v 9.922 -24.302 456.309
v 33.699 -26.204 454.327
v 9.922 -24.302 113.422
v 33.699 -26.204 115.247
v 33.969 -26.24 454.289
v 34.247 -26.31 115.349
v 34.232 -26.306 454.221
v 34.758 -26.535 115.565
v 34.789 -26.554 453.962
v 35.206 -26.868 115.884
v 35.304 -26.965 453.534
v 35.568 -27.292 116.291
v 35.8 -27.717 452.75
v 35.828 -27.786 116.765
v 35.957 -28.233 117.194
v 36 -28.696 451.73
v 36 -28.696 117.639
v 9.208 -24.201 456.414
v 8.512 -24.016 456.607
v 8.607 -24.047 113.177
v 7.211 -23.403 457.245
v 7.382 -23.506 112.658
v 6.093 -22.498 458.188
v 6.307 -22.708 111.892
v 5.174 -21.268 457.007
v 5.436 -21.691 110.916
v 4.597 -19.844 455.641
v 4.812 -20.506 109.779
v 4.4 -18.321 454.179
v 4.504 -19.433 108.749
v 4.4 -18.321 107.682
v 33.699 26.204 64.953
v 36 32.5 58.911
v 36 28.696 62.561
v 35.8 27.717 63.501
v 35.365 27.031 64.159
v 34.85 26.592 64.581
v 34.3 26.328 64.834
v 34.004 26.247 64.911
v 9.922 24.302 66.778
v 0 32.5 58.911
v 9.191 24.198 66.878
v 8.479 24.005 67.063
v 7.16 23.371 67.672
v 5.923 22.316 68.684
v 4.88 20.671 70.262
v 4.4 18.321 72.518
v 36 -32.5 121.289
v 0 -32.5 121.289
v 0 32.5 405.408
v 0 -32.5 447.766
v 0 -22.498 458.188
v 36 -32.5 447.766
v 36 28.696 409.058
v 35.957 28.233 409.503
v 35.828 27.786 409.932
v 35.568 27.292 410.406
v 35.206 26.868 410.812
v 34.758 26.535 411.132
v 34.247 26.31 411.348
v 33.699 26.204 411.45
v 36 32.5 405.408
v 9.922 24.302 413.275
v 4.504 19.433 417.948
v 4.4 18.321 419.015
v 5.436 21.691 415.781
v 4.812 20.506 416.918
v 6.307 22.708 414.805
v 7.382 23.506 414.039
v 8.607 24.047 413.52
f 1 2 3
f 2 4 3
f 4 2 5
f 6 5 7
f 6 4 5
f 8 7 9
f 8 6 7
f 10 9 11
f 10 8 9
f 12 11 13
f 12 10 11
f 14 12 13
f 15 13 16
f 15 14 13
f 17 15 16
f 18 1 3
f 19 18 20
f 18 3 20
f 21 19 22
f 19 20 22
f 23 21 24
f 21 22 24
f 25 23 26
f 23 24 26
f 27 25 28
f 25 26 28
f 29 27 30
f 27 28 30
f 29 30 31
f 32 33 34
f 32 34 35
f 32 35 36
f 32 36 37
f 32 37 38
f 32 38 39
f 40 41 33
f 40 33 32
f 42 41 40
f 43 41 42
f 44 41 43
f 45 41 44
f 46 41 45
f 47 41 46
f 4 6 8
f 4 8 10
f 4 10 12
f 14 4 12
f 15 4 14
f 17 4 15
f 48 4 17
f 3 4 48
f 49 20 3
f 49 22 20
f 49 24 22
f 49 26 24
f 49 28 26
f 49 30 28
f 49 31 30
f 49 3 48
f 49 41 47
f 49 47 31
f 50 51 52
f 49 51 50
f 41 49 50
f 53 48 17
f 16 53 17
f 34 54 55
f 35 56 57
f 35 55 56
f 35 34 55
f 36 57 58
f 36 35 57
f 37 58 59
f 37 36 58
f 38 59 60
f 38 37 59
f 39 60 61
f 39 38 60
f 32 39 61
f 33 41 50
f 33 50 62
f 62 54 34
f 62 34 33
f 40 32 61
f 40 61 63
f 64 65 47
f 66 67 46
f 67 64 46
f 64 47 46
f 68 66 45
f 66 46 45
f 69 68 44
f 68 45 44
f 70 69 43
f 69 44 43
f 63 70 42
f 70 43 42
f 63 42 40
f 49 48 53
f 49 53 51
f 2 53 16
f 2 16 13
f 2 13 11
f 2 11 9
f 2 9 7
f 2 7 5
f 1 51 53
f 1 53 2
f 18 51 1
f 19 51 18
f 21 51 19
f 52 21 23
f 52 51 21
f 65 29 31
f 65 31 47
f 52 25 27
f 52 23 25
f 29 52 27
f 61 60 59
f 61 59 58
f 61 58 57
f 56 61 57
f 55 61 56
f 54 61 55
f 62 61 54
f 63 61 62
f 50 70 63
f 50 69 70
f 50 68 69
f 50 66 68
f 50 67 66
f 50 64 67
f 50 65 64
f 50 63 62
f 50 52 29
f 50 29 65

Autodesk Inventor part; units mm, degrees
ref_plane "Начальная плоскость" through (0, 0, 58.9006) normal (0, 0, 1) x (1, 0, 0)
ref_plane "Конечная плоскость" through (0, 0, 458.193) normal (0, 0, 1) x (1, 0, 0)
sketch "Эскиз" plane through (0, 0, 0) normal (0, 0, 1) x (1, 0, 0)
  line L0 (36, -32.5) -> (0, -32.5)
  line L1 (36, -32.5) -> (36, -28.696)
  line L2 (33.6994, -26.2039) -> (9.9215, -24.3017)
  line L3 (4.4, -18.3208) -> (4.4, 18.3208)
  line L4 (33.6994, 26.2039) -> (9.9215, 24.3017)
  line L5 (36, 28.696) -> (36, 32.5)
  line L6 (0, 32.5) -> (36, 32.5)
  line L7 (0, -32.5) -> (0, 32.5)
  arc A0 (4.4, -18.3208) -> (9.9215, -24.3017) centre (10.4, -18.3208) ccw
  arc A1 (9.9215, 24.3017) -> (4.4, 18.3208) centre (10.4, 18.3208) ccw
  arc A2 (36, -28.696) -> (33.6994, -26.2039) centre (33.5, -28.696) ccw
  arc A3 (33.6994, 26.2039) -> (36, 28.696) centre (33.5, 28.696) ccw
  line L8 (0, 45.5) -> (0, -45.5) construction
  line L9 (-7.2974, 0) -> (43.7847, 0) construction
  point P0 (36, -26.388)
  point P1 (4.4, -23.86)
  point P2 (4.4, 23.86)
  point P3 (36, 26.388)
  dimension "d3" = 36
  dimension "d5" = 4.4
  dimension "d7" = 65
  dimension "d9" = 8.64
  dimension "d11" = 8.64
  dimension "d13" = 6.112
  dimension "d15" = 6.112
  dimension "d22" = 6
  dimension "d23" = 2.5
  dimension "d24" = 32.5
  dimension "d25" = 0
extrude "Тело" add sketch "Эскиз" along normal up to surface (399.2924 mm away) from surface at 58.9006
sketch "Sketch3" plane through (0, 0, 0) normal (0, 0, 1) x (1, 0, 0)
  line L0 (0, 0) -> (10, 0)
ref_plane "Work Plane7" through (0, 0, 0) normal (0, -1, 0) x (1, 0, 0)
sketch "Sketch4" plane through (0, 0, 0) normal (0, -1, 0) x (1, 0, 0)
  line L0 (-2, 58.9006) -> (12, 58.9006)
  line L1 (-2, 458.193) -> (12, 458.193)
  dimension "d29" = 399.2924
ref_plane "РабПлоскость8" through (36, -195.6097, 277.8202) normal (0, -0.6924, -0.7215) x (1, 0, 0)
split "Разделение1" plane through (36, -195.6097, 277.8202) removes the side toward (0, -0.6924, -0.7215)
ref_plane "РабПлоскость9" through (0, -22.5038, 458.193) normal (0, 0.6924, 0.7215) x (1, 0, 0)
split "Разделение2" plane through (0, -22.5038, 458.193) removes the side toward (0, 0.6924, 0.7215)
ref_plane "РабПлоскость10" through (-29, 195.6464, 685.5009) normal (0, -0.7215, 0.6924) x (1, 0, 0)
split "Разделение3" plane through (-29, 195.6464, 685.5009) removes the side toward (0, -0.7215, 0.6924)
equation "\"d3\" = b"
equation "\"d5\" = t1"
equation "\"d7\" = ParH"
equation "\"d9\" = msp_x1 + t2"
equation "\"d11\" = msp_x1 + t2"
equation "\"d13\" = -msp_x2 + t2"
equation "\"d15\" = -msp_x2 + t2"
equation "\"d22\" = R"
equation "\"d23\" = R1"
equation "\"d24\" = 0.5 * d7"
equation "\"d16\" = G_L"
equation "\"R1\" = 2.5"
equation "\"R\" = 6"
equation "\"t1\" = 4.4"
equation "\"t2\" = 7.2"
equation "\"ParH\" = 65"
equation "\"b\" = 36"
equation "\"msp_x1\" = 0.04 * b"
equation "\"msp_x2\" = -0.08 * t1 + 0.04 * b"
equation "\"G_L\" = d29"
equation "\"ex\" = 0"
equation "\"G_OFFSET_START\" = -58.90056"
equation "\"G_OFFSET_END\" = -23.44846"
equation "\"d26\" = -G_OFFSET_START"
equation "\"d27\" = G_OFFSET_END + B_L"
equation "\"B_L\" = 481.64146"
properties part number "Швеллер 6.5U-399,29 ГОСТ 8240-97" material "Сталь, мягкая"
